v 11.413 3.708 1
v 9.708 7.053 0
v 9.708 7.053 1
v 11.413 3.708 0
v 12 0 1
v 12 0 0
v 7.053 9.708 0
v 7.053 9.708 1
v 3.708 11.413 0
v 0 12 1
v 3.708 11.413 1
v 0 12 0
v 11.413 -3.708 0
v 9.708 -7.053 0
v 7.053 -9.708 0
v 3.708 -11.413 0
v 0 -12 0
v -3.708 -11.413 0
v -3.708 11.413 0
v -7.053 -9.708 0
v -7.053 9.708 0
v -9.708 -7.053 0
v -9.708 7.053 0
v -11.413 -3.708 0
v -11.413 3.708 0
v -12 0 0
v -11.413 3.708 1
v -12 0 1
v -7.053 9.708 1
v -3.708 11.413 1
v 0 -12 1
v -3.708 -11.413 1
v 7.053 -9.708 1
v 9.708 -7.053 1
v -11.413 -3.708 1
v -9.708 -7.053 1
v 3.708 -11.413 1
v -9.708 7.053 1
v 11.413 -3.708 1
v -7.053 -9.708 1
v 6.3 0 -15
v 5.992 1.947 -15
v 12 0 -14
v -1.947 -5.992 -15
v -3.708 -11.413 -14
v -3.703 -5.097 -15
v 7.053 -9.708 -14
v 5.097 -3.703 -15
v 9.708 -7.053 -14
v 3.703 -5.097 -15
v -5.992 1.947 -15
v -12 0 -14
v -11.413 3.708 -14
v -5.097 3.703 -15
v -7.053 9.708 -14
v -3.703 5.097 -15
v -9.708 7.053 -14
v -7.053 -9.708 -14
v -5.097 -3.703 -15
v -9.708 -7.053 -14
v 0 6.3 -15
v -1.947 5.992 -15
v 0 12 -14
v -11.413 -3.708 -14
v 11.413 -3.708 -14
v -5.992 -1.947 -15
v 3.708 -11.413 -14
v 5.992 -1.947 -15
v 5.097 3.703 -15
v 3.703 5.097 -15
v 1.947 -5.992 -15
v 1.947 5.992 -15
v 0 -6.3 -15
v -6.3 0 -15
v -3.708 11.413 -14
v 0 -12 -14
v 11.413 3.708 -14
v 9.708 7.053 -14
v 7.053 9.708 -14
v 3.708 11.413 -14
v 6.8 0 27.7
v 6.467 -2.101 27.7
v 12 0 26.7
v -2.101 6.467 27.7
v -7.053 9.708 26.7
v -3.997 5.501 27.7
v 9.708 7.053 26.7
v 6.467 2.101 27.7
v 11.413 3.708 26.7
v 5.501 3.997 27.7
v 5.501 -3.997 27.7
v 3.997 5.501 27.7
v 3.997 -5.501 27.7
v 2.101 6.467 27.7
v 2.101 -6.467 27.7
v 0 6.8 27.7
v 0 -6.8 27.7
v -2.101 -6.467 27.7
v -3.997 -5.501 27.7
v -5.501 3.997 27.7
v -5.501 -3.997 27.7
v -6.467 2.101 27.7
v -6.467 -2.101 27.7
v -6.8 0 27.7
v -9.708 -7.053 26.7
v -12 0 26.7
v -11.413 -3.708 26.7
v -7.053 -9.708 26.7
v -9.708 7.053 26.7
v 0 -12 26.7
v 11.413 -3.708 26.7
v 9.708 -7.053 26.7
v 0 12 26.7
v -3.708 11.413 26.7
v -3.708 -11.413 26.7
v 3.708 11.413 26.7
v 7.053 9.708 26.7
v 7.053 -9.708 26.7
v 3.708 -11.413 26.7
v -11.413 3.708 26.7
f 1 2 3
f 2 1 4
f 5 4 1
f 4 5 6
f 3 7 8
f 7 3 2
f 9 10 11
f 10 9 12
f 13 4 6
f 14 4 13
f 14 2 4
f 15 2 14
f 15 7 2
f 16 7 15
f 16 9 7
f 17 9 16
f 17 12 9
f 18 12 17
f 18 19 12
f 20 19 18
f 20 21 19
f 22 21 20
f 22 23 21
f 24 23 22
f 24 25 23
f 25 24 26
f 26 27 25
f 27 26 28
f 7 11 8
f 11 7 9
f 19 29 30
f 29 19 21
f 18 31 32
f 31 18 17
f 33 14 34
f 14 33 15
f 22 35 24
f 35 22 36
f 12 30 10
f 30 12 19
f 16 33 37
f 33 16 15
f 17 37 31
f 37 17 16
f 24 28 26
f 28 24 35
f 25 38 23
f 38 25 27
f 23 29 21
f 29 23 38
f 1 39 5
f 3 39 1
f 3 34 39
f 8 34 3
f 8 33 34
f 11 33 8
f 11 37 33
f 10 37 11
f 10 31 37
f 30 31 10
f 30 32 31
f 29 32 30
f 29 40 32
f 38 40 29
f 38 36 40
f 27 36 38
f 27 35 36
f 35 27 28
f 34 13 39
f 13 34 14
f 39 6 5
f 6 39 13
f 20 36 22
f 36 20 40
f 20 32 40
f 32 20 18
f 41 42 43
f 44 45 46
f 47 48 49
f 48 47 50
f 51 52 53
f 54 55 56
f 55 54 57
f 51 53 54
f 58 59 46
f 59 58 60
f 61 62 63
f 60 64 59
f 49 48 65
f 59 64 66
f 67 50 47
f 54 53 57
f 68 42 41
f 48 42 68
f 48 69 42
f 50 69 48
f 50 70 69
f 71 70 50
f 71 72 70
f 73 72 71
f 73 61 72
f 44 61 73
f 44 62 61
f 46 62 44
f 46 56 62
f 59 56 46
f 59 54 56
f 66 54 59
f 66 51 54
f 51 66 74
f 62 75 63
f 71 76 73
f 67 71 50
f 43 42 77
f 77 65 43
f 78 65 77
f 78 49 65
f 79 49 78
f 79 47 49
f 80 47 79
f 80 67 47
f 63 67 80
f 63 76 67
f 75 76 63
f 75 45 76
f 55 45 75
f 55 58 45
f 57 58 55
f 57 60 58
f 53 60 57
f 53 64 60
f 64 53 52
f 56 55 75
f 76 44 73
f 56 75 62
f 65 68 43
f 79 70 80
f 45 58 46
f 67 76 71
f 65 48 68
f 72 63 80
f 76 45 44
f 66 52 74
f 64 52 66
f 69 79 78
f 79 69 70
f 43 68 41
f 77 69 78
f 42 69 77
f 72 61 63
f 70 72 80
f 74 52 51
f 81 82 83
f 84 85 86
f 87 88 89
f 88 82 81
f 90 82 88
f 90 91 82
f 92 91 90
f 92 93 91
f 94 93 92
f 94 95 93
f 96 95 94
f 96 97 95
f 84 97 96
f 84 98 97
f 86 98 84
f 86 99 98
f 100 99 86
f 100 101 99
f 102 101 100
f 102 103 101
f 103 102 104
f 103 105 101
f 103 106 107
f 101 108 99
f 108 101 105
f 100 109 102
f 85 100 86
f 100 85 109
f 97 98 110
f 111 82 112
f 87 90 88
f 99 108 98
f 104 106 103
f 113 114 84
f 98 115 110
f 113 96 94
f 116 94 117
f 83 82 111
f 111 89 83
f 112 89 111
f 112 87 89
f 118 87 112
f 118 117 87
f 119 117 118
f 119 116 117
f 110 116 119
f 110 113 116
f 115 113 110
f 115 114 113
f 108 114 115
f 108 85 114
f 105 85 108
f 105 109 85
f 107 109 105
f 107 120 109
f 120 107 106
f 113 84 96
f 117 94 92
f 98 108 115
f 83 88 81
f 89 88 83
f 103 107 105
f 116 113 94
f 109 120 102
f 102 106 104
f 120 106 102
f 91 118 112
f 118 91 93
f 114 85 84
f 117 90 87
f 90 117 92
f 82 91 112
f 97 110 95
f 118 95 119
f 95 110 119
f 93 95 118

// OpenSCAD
$fn=20;

MAIN_BODY_DIA=24;

THREADED_DIA=8.6;
CLEAR_DIA = THREADED_DIA + 1;

POINTY_LEN=30;

BODY_LEN= .5 * 25.4;

THREADED_LENGTH= 4;

module remove()
{
    translate([ 0, 0, -POINTY_LEN ])
    color("RED") cylinder(d= THREADED_DIA, h=THREADED_LENGTH, true);

    // don't run the fat hole all the way to the bottom.
    color("BLUE") translate([ 0, 0, -POINTY_LEN + THREADED_LENGTH])
    cylinder(d= CLEAR_DIA, h=BODY_LEN + POINTY_LEN *2 - THREADED_LENGTH , true); 
    
 }
 
 module add()
 {
        color("CYAN", .3) cylinder(d=MAIN_BODY_DIA, h=BODY_LEN, true);

        translate([0, 0, -POINTY_LEN/2])
        color("GREEN", .3)
        cylinder(r2=MAIN_BODY_DIA/2, r1= THREADED_DIA/2 + 2, h=POINTY_LEN, true);

        translate([0, 0, BODY_LEN + POINTY_LEN/2])
        rotate([180,0,0])
        color("YELLOW", .3)
        cylinder(r2=MAIN_BODY_DIA/2, r1=CLEAR_DIA/2 +2, h=POINTY_LEN, true);

}


//add();
//remove();

difference()
{
        add();
        remove();
}
